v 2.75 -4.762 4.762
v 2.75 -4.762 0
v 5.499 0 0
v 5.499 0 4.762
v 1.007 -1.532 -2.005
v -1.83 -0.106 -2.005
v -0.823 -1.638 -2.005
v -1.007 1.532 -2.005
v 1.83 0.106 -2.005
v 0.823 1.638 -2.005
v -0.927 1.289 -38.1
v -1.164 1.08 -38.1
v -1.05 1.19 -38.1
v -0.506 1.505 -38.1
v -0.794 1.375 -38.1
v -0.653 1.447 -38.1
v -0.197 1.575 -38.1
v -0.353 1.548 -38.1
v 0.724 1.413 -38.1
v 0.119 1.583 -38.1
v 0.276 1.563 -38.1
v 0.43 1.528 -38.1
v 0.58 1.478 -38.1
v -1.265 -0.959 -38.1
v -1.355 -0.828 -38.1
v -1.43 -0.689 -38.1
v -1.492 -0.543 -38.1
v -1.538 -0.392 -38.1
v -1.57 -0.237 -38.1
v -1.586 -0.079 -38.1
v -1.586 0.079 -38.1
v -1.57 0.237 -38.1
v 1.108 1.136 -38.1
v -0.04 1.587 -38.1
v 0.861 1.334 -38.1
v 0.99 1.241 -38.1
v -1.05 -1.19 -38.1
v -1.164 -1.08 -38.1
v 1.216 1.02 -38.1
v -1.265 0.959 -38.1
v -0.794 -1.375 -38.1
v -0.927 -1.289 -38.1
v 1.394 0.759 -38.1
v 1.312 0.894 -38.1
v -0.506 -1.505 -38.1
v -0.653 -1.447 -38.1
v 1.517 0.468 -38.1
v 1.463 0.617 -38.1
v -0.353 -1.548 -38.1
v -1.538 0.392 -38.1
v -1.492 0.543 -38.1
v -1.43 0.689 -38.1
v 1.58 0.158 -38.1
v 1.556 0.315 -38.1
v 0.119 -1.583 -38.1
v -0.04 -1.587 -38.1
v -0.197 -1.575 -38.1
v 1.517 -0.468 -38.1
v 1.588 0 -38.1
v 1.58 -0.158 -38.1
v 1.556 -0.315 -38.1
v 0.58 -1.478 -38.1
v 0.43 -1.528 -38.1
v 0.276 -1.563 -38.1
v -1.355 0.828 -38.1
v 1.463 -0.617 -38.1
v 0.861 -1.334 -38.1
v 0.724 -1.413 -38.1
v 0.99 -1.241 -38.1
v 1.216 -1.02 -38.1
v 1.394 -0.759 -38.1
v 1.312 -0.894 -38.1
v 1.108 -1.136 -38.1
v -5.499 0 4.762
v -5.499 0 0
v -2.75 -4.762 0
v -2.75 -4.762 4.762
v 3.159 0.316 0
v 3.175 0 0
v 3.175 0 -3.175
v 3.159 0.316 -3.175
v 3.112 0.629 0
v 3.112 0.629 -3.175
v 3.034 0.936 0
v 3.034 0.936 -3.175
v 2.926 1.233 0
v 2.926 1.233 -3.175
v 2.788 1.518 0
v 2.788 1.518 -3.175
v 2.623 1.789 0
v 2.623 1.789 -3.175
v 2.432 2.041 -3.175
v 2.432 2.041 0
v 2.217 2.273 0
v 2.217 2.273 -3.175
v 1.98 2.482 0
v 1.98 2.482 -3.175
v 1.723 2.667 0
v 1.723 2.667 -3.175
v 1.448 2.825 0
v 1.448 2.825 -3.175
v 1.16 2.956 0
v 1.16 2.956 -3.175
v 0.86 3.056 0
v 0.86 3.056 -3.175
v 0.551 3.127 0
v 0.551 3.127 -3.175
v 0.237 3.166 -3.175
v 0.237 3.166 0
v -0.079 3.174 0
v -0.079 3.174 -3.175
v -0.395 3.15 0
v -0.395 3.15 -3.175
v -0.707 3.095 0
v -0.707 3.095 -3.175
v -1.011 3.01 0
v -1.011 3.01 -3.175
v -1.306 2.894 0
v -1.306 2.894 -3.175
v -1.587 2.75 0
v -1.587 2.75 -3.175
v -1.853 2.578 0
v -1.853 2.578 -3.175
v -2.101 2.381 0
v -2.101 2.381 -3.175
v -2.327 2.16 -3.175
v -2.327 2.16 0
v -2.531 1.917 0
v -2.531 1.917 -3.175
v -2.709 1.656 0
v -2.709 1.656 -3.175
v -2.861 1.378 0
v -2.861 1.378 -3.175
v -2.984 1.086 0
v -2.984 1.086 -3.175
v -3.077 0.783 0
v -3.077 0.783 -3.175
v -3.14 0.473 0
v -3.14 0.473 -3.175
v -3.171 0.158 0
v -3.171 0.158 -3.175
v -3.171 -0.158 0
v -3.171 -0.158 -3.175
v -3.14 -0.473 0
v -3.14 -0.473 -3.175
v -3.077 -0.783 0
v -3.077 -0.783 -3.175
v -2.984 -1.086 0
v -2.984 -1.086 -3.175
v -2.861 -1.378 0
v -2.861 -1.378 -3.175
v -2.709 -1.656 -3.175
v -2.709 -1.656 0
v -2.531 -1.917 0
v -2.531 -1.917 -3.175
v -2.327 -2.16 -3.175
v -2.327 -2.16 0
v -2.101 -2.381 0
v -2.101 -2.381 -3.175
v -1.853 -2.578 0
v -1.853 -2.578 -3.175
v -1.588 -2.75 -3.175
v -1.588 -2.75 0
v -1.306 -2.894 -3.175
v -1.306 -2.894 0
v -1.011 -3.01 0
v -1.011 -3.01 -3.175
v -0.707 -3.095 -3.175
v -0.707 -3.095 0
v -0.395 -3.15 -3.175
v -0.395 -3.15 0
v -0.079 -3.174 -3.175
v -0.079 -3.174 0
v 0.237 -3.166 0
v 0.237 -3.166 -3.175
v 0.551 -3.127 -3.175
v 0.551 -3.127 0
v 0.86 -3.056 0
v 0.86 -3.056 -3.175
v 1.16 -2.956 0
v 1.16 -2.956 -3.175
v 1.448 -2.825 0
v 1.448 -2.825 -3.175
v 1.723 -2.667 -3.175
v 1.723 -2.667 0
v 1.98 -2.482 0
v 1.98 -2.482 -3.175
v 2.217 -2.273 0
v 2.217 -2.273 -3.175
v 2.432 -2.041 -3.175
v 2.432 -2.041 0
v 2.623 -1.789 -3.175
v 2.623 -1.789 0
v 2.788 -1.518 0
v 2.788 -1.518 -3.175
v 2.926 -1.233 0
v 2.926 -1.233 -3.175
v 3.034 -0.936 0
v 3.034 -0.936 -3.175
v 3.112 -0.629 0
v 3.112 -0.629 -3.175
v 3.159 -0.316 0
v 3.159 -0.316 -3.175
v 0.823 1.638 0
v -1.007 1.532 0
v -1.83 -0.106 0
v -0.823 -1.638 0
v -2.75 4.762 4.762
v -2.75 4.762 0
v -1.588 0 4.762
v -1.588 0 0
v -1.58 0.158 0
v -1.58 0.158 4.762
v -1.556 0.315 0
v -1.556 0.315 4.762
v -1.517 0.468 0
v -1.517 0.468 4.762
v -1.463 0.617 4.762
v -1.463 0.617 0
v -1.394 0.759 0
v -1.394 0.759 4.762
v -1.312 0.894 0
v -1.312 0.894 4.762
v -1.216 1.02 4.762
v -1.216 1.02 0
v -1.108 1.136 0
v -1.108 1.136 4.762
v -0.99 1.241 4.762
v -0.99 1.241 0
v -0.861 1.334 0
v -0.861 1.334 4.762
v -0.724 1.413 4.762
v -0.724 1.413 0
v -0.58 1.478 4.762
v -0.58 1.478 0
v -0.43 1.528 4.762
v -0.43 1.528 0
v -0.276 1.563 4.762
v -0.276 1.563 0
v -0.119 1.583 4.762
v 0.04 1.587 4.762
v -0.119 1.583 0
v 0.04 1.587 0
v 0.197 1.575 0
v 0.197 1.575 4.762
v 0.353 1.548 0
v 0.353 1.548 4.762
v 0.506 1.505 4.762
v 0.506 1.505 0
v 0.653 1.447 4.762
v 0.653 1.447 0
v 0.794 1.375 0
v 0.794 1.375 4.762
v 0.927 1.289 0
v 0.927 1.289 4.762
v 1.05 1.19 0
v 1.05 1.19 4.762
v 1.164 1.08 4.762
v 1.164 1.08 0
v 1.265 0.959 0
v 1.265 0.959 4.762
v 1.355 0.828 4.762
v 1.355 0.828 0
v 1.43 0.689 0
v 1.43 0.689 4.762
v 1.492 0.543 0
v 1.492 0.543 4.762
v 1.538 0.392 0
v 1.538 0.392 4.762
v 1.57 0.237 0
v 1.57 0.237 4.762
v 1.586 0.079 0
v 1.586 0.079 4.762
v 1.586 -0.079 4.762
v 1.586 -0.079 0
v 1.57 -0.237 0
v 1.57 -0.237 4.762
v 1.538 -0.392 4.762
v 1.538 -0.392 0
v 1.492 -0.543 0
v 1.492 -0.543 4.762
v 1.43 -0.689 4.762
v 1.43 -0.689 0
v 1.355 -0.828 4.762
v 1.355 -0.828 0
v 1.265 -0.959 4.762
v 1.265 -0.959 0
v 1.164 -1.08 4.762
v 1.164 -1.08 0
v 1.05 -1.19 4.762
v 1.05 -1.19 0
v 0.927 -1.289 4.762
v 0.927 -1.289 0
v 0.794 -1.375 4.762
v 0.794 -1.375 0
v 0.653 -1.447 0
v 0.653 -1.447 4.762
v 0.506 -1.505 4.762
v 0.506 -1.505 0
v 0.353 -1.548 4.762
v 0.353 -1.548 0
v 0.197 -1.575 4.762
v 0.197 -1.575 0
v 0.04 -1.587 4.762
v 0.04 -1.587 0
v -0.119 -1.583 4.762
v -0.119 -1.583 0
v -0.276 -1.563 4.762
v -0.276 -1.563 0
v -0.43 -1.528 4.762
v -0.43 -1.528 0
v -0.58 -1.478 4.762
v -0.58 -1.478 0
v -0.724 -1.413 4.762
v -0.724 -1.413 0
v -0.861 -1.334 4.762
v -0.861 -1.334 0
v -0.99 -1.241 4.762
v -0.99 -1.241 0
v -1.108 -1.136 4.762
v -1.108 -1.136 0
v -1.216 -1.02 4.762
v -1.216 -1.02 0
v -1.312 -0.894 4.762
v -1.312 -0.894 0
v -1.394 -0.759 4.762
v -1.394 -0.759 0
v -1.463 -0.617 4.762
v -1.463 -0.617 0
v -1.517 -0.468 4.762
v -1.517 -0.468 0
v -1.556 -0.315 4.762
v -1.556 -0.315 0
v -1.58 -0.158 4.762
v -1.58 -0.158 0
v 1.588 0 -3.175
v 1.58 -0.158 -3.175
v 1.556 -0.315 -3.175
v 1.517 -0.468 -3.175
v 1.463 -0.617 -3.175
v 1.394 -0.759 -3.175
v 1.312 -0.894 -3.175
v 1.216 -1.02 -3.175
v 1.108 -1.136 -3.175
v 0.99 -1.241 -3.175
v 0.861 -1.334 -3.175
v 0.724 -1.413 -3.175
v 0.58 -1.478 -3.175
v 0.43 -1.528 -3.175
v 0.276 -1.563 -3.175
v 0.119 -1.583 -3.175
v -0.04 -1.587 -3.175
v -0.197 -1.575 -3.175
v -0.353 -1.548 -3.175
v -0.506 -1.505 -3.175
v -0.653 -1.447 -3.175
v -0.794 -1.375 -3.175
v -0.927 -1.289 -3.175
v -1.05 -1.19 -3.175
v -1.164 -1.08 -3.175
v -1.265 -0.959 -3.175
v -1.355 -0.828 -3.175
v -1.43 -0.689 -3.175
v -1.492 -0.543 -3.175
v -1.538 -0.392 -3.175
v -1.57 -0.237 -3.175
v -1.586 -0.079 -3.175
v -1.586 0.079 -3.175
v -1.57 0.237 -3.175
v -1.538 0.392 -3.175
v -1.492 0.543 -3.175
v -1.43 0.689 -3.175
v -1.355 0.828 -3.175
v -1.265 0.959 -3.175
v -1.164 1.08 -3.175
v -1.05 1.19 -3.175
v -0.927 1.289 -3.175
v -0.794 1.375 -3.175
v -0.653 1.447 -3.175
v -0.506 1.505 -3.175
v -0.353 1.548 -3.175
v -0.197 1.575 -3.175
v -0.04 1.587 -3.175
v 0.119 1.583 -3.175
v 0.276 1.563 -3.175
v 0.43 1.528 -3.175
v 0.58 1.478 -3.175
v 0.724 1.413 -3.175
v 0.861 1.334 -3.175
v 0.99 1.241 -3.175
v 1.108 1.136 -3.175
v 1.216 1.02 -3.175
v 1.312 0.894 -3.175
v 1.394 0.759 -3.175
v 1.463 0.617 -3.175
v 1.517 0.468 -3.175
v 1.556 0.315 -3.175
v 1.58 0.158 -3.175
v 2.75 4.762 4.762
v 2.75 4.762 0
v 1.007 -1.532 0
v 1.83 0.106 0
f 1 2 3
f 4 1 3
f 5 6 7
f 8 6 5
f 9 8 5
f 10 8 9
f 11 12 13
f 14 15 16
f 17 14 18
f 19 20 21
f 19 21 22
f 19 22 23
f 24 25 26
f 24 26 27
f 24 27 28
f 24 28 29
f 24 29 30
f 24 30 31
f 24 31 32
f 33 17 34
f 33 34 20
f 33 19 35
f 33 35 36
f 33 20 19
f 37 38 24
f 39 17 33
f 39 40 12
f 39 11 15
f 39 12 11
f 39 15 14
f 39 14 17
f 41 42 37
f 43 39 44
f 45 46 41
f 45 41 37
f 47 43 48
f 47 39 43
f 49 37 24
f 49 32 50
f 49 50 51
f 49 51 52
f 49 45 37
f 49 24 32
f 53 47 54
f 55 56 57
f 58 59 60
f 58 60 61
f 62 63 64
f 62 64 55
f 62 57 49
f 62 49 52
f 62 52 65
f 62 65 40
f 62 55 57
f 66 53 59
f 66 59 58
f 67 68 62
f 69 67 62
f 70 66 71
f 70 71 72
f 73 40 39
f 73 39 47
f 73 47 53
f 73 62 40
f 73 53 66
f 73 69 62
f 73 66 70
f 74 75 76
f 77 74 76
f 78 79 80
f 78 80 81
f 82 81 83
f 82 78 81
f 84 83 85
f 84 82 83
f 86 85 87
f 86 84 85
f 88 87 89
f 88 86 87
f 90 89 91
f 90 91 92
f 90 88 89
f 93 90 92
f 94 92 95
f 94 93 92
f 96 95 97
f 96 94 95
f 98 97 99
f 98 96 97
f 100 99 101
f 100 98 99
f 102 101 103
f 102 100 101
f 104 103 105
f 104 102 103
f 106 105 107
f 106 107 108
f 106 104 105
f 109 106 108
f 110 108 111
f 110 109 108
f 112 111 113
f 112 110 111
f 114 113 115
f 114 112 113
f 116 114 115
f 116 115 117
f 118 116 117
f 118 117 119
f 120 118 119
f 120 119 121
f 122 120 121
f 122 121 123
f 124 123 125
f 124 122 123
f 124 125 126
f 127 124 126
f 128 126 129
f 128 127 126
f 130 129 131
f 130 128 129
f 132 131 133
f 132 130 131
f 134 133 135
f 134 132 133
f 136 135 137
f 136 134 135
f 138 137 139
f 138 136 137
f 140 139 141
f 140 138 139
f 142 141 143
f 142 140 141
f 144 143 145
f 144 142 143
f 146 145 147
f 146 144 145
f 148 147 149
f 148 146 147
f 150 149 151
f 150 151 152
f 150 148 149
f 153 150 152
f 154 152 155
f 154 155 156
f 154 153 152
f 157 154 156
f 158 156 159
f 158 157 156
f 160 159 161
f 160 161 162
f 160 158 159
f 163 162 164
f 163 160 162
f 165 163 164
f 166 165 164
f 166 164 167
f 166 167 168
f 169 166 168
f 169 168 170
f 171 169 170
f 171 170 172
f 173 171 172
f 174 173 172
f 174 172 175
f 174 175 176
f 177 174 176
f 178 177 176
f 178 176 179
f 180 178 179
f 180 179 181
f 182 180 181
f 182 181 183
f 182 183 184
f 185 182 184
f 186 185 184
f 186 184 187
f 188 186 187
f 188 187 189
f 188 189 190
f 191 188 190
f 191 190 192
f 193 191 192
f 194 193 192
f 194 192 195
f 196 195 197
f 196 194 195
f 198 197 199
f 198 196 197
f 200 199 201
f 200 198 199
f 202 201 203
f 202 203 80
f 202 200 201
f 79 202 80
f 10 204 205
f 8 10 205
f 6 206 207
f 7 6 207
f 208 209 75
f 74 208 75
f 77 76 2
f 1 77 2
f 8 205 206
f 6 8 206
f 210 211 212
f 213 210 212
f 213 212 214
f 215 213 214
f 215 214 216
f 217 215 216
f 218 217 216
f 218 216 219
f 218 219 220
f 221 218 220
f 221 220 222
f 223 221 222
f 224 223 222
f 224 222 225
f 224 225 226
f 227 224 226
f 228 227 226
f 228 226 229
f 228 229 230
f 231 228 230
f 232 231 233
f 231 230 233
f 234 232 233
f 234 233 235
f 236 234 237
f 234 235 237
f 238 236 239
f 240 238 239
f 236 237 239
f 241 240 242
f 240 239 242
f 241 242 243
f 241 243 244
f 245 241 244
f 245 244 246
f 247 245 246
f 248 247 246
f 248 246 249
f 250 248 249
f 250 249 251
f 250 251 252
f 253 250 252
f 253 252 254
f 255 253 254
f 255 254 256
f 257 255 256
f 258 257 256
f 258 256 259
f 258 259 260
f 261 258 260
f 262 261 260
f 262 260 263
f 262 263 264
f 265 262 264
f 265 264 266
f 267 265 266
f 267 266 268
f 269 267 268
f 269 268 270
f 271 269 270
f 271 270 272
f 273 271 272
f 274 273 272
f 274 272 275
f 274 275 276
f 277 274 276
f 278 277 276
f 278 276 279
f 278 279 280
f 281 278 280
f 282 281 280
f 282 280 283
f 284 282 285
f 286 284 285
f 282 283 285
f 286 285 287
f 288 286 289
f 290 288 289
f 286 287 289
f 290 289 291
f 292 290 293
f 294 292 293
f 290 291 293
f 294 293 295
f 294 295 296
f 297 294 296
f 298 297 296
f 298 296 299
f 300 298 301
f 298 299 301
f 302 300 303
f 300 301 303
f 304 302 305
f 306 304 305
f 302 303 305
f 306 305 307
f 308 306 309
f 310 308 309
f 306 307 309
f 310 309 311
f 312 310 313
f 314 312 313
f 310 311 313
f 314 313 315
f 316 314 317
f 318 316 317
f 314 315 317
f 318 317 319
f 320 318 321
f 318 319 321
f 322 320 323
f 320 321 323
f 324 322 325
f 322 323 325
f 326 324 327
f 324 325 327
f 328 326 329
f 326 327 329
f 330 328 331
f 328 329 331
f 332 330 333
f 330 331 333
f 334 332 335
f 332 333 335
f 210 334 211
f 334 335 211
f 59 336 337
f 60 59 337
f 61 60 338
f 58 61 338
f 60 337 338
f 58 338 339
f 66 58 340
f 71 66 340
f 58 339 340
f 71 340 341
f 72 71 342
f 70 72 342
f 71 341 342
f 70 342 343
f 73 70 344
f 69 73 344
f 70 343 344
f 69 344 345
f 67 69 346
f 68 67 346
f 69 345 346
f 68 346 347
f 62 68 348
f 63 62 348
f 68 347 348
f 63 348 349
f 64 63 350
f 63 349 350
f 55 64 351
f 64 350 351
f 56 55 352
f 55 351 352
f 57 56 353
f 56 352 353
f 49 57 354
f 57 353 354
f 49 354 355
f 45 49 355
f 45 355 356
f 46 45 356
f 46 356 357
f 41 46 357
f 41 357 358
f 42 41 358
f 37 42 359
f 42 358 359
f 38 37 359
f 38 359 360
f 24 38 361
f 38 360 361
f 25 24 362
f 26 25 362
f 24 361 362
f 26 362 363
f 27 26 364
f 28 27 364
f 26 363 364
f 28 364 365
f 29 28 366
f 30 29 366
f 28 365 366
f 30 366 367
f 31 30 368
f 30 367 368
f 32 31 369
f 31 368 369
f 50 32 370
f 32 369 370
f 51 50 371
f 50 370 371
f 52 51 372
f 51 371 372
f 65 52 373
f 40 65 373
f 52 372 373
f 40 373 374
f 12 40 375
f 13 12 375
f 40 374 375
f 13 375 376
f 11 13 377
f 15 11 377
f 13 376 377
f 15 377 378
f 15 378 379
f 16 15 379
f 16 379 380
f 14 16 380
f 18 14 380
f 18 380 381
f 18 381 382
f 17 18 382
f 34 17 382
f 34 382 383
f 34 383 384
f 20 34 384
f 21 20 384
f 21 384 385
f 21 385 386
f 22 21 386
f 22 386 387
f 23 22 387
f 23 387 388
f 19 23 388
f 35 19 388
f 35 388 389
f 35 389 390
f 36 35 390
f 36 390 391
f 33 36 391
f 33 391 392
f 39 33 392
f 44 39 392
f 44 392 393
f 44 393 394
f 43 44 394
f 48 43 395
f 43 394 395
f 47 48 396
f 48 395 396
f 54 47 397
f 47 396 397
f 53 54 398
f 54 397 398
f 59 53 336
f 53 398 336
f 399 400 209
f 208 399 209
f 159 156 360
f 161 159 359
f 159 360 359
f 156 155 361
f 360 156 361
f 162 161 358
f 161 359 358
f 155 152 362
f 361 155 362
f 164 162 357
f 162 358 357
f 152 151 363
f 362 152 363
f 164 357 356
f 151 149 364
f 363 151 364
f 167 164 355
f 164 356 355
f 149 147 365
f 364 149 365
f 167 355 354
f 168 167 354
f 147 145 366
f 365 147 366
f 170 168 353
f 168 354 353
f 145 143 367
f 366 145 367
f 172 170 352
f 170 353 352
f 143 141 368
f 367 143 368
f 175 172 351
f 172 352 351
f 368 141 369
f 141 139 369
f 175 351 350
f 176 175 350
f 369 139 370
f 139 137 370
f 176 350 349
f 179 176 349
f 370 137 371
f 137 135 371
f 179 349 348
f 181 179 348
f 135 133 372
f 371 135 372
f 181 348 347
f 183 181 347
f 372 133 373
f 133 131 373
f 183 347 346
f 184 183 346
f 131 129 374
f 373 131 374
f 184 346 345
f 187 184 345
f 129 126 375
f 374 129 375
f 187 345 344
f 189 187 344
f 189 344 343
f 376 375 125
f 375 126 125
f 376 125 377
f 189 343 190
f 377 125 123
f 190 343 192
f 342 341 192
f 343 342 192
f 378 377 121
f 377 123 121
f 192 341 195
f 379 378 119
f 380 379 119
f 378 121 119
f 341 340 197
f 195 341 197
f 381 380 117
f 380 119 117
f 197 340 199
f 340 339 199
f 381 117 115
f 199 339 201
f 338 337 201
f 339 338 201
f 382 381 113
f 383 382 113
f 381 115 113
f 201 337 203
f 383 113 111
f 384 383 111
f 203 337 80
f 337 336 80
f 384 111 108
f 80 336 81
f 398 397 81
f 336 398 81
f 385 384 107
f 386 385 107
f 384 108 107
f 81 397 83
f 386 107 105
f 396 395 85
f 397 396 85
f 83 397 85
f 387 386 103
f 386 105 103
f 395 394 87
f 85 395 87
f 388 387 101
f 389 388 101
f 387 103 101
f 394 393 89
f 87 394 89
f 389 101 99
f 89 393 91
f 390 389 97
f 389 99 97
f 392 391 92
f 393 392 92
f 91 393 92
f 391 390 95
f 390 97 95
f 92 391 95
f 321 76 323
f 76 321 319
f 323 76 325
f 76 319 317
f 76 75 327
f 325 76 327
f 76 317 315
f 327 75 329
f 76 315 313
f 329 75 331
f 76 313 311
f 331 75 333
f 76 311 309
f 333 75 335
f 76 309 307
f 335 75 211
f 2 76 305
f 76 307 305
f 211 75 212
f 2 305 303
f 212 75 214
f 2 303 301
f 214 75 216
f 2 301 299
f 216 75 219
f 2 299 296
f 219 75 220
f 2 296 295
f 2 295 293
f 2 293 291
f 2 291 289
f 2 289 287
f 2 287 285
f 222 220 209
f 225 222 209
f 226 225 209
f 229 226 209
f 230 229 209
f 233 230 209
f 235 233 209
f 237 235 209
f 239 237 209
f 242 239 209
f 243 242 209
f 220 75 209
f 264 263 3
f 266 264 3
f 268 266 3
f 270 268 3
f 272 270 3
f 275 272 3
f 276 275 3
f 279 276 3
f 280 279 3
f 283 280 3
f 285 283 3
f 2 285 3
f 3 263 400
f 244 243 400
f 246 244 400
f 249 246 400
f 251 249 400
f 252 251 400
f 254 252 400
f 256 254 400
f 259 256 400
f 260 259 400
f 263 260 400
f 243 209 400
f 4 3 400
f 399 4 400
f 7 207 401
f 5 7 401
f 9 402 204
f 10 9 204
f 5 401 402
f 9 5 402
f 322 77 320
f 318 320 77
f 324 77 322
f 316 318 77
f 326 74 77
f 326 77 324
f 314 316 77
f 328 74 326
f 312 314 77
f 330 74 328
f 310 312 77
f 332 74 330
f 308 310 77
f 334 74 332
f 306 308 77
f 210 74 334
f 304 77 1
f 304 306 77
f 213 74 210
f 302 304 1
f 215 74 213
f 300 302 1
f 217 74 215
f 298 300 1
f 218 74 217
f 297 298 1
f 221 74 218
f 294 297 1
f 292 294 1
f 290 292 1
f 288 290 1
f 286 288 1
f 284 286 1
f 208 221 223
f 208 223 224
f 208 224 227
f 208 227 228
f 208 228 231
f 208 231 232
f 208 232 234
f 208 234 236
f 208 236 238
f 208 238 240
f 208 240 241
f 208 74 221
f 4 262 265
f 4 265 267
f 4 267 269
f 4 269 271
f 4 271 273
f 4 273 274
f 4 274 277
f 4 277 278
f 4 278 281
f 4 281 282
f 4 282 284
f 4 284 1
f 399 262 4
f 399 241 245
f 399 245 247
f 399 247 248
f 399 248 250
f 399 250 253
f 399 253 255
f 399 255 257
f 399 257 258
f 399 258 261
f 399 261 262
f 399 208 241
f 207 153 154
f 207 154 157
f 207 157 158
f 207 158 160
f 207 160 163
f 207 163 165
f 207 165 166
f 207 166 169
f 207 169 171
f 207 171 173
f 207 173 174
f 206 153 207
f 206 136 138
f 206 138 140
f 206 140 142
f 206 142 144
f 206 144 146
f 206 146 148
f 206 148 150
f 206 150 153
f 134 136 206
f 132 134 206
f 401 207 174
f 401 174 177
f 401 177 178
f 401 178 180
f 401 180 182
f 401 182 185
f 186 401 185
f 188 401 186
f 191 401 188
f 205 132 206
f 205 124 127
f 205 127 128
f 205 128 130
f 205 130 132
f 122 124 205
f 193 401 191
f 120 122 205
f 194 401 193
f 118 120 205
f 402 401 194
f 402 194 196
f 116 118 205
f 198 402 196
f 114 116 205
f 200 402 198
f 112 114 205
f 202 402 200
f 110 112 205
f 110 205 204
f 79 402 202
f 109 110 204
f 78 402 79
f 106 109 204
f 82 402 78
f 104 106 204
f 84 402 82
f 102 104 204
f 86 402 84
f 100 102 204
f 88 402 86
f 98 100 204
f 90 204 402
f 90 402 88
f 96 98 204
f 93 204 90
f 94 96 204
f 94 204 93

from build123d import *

# Parameters (mm, degrees)
F1_DEPTH  = 4.7625
F3_D      = 3.175
F4_R      = 3.175
F5_DEPTH  = 3.175
F7_R      = 1.5875
F8_DEPTH  = 34.925
F10_DEPTH = 2.005263


with BuildPart() as f1:
    # F0 (on Top) → F1 (new body)
    with BuildSketch(Plane.XY):
        Polygon((-2.749631, -4.7625), (2.749631, -4.7625), (5.499261, 0), (2.749631, 4.7625), (-2.749631, 4.7625), (-5.499261, 0), align=None)
    extrude(amount=F1_DEPTH)

    # F3 (through all)
    with Locations(Plane.XY.offset(4.7625)):
        with Locations((0, 0)):
            Hole(F3_D / 2)


with BuildPart() as f5:
    # F4 (on Top) → F5 (new body)
    with BuildSketch(Plane.XY):
        Circle(F4_R)
    extrude(amount=-F5_DEPTH)

    # F7 (on face) → F8 (join)
    with BuildSketch(Plane(origin=(0, 0, -3.175), x_dir=(1, 0, 0), z_dir=(0, 0, -1))):
        Circle(F7_R)
    extrude(amount=F8_DEPTH)

    # F9 (on Top) → F10 (cut)
    with BuildSketch(Plane.XY):
        Polygon((1.830024, 0.105922), (0.823281, 1.637809), (-1.006743, 1.531886), (-1.830024, -0.105922), (-0.823281, -1.637809), (1.006743, -1.531886), align=None)
    extrude(amount=-F10_DEPTH, mode=Mode.SUBTRACT)


solid = Compound([f1.part, f5.part])
